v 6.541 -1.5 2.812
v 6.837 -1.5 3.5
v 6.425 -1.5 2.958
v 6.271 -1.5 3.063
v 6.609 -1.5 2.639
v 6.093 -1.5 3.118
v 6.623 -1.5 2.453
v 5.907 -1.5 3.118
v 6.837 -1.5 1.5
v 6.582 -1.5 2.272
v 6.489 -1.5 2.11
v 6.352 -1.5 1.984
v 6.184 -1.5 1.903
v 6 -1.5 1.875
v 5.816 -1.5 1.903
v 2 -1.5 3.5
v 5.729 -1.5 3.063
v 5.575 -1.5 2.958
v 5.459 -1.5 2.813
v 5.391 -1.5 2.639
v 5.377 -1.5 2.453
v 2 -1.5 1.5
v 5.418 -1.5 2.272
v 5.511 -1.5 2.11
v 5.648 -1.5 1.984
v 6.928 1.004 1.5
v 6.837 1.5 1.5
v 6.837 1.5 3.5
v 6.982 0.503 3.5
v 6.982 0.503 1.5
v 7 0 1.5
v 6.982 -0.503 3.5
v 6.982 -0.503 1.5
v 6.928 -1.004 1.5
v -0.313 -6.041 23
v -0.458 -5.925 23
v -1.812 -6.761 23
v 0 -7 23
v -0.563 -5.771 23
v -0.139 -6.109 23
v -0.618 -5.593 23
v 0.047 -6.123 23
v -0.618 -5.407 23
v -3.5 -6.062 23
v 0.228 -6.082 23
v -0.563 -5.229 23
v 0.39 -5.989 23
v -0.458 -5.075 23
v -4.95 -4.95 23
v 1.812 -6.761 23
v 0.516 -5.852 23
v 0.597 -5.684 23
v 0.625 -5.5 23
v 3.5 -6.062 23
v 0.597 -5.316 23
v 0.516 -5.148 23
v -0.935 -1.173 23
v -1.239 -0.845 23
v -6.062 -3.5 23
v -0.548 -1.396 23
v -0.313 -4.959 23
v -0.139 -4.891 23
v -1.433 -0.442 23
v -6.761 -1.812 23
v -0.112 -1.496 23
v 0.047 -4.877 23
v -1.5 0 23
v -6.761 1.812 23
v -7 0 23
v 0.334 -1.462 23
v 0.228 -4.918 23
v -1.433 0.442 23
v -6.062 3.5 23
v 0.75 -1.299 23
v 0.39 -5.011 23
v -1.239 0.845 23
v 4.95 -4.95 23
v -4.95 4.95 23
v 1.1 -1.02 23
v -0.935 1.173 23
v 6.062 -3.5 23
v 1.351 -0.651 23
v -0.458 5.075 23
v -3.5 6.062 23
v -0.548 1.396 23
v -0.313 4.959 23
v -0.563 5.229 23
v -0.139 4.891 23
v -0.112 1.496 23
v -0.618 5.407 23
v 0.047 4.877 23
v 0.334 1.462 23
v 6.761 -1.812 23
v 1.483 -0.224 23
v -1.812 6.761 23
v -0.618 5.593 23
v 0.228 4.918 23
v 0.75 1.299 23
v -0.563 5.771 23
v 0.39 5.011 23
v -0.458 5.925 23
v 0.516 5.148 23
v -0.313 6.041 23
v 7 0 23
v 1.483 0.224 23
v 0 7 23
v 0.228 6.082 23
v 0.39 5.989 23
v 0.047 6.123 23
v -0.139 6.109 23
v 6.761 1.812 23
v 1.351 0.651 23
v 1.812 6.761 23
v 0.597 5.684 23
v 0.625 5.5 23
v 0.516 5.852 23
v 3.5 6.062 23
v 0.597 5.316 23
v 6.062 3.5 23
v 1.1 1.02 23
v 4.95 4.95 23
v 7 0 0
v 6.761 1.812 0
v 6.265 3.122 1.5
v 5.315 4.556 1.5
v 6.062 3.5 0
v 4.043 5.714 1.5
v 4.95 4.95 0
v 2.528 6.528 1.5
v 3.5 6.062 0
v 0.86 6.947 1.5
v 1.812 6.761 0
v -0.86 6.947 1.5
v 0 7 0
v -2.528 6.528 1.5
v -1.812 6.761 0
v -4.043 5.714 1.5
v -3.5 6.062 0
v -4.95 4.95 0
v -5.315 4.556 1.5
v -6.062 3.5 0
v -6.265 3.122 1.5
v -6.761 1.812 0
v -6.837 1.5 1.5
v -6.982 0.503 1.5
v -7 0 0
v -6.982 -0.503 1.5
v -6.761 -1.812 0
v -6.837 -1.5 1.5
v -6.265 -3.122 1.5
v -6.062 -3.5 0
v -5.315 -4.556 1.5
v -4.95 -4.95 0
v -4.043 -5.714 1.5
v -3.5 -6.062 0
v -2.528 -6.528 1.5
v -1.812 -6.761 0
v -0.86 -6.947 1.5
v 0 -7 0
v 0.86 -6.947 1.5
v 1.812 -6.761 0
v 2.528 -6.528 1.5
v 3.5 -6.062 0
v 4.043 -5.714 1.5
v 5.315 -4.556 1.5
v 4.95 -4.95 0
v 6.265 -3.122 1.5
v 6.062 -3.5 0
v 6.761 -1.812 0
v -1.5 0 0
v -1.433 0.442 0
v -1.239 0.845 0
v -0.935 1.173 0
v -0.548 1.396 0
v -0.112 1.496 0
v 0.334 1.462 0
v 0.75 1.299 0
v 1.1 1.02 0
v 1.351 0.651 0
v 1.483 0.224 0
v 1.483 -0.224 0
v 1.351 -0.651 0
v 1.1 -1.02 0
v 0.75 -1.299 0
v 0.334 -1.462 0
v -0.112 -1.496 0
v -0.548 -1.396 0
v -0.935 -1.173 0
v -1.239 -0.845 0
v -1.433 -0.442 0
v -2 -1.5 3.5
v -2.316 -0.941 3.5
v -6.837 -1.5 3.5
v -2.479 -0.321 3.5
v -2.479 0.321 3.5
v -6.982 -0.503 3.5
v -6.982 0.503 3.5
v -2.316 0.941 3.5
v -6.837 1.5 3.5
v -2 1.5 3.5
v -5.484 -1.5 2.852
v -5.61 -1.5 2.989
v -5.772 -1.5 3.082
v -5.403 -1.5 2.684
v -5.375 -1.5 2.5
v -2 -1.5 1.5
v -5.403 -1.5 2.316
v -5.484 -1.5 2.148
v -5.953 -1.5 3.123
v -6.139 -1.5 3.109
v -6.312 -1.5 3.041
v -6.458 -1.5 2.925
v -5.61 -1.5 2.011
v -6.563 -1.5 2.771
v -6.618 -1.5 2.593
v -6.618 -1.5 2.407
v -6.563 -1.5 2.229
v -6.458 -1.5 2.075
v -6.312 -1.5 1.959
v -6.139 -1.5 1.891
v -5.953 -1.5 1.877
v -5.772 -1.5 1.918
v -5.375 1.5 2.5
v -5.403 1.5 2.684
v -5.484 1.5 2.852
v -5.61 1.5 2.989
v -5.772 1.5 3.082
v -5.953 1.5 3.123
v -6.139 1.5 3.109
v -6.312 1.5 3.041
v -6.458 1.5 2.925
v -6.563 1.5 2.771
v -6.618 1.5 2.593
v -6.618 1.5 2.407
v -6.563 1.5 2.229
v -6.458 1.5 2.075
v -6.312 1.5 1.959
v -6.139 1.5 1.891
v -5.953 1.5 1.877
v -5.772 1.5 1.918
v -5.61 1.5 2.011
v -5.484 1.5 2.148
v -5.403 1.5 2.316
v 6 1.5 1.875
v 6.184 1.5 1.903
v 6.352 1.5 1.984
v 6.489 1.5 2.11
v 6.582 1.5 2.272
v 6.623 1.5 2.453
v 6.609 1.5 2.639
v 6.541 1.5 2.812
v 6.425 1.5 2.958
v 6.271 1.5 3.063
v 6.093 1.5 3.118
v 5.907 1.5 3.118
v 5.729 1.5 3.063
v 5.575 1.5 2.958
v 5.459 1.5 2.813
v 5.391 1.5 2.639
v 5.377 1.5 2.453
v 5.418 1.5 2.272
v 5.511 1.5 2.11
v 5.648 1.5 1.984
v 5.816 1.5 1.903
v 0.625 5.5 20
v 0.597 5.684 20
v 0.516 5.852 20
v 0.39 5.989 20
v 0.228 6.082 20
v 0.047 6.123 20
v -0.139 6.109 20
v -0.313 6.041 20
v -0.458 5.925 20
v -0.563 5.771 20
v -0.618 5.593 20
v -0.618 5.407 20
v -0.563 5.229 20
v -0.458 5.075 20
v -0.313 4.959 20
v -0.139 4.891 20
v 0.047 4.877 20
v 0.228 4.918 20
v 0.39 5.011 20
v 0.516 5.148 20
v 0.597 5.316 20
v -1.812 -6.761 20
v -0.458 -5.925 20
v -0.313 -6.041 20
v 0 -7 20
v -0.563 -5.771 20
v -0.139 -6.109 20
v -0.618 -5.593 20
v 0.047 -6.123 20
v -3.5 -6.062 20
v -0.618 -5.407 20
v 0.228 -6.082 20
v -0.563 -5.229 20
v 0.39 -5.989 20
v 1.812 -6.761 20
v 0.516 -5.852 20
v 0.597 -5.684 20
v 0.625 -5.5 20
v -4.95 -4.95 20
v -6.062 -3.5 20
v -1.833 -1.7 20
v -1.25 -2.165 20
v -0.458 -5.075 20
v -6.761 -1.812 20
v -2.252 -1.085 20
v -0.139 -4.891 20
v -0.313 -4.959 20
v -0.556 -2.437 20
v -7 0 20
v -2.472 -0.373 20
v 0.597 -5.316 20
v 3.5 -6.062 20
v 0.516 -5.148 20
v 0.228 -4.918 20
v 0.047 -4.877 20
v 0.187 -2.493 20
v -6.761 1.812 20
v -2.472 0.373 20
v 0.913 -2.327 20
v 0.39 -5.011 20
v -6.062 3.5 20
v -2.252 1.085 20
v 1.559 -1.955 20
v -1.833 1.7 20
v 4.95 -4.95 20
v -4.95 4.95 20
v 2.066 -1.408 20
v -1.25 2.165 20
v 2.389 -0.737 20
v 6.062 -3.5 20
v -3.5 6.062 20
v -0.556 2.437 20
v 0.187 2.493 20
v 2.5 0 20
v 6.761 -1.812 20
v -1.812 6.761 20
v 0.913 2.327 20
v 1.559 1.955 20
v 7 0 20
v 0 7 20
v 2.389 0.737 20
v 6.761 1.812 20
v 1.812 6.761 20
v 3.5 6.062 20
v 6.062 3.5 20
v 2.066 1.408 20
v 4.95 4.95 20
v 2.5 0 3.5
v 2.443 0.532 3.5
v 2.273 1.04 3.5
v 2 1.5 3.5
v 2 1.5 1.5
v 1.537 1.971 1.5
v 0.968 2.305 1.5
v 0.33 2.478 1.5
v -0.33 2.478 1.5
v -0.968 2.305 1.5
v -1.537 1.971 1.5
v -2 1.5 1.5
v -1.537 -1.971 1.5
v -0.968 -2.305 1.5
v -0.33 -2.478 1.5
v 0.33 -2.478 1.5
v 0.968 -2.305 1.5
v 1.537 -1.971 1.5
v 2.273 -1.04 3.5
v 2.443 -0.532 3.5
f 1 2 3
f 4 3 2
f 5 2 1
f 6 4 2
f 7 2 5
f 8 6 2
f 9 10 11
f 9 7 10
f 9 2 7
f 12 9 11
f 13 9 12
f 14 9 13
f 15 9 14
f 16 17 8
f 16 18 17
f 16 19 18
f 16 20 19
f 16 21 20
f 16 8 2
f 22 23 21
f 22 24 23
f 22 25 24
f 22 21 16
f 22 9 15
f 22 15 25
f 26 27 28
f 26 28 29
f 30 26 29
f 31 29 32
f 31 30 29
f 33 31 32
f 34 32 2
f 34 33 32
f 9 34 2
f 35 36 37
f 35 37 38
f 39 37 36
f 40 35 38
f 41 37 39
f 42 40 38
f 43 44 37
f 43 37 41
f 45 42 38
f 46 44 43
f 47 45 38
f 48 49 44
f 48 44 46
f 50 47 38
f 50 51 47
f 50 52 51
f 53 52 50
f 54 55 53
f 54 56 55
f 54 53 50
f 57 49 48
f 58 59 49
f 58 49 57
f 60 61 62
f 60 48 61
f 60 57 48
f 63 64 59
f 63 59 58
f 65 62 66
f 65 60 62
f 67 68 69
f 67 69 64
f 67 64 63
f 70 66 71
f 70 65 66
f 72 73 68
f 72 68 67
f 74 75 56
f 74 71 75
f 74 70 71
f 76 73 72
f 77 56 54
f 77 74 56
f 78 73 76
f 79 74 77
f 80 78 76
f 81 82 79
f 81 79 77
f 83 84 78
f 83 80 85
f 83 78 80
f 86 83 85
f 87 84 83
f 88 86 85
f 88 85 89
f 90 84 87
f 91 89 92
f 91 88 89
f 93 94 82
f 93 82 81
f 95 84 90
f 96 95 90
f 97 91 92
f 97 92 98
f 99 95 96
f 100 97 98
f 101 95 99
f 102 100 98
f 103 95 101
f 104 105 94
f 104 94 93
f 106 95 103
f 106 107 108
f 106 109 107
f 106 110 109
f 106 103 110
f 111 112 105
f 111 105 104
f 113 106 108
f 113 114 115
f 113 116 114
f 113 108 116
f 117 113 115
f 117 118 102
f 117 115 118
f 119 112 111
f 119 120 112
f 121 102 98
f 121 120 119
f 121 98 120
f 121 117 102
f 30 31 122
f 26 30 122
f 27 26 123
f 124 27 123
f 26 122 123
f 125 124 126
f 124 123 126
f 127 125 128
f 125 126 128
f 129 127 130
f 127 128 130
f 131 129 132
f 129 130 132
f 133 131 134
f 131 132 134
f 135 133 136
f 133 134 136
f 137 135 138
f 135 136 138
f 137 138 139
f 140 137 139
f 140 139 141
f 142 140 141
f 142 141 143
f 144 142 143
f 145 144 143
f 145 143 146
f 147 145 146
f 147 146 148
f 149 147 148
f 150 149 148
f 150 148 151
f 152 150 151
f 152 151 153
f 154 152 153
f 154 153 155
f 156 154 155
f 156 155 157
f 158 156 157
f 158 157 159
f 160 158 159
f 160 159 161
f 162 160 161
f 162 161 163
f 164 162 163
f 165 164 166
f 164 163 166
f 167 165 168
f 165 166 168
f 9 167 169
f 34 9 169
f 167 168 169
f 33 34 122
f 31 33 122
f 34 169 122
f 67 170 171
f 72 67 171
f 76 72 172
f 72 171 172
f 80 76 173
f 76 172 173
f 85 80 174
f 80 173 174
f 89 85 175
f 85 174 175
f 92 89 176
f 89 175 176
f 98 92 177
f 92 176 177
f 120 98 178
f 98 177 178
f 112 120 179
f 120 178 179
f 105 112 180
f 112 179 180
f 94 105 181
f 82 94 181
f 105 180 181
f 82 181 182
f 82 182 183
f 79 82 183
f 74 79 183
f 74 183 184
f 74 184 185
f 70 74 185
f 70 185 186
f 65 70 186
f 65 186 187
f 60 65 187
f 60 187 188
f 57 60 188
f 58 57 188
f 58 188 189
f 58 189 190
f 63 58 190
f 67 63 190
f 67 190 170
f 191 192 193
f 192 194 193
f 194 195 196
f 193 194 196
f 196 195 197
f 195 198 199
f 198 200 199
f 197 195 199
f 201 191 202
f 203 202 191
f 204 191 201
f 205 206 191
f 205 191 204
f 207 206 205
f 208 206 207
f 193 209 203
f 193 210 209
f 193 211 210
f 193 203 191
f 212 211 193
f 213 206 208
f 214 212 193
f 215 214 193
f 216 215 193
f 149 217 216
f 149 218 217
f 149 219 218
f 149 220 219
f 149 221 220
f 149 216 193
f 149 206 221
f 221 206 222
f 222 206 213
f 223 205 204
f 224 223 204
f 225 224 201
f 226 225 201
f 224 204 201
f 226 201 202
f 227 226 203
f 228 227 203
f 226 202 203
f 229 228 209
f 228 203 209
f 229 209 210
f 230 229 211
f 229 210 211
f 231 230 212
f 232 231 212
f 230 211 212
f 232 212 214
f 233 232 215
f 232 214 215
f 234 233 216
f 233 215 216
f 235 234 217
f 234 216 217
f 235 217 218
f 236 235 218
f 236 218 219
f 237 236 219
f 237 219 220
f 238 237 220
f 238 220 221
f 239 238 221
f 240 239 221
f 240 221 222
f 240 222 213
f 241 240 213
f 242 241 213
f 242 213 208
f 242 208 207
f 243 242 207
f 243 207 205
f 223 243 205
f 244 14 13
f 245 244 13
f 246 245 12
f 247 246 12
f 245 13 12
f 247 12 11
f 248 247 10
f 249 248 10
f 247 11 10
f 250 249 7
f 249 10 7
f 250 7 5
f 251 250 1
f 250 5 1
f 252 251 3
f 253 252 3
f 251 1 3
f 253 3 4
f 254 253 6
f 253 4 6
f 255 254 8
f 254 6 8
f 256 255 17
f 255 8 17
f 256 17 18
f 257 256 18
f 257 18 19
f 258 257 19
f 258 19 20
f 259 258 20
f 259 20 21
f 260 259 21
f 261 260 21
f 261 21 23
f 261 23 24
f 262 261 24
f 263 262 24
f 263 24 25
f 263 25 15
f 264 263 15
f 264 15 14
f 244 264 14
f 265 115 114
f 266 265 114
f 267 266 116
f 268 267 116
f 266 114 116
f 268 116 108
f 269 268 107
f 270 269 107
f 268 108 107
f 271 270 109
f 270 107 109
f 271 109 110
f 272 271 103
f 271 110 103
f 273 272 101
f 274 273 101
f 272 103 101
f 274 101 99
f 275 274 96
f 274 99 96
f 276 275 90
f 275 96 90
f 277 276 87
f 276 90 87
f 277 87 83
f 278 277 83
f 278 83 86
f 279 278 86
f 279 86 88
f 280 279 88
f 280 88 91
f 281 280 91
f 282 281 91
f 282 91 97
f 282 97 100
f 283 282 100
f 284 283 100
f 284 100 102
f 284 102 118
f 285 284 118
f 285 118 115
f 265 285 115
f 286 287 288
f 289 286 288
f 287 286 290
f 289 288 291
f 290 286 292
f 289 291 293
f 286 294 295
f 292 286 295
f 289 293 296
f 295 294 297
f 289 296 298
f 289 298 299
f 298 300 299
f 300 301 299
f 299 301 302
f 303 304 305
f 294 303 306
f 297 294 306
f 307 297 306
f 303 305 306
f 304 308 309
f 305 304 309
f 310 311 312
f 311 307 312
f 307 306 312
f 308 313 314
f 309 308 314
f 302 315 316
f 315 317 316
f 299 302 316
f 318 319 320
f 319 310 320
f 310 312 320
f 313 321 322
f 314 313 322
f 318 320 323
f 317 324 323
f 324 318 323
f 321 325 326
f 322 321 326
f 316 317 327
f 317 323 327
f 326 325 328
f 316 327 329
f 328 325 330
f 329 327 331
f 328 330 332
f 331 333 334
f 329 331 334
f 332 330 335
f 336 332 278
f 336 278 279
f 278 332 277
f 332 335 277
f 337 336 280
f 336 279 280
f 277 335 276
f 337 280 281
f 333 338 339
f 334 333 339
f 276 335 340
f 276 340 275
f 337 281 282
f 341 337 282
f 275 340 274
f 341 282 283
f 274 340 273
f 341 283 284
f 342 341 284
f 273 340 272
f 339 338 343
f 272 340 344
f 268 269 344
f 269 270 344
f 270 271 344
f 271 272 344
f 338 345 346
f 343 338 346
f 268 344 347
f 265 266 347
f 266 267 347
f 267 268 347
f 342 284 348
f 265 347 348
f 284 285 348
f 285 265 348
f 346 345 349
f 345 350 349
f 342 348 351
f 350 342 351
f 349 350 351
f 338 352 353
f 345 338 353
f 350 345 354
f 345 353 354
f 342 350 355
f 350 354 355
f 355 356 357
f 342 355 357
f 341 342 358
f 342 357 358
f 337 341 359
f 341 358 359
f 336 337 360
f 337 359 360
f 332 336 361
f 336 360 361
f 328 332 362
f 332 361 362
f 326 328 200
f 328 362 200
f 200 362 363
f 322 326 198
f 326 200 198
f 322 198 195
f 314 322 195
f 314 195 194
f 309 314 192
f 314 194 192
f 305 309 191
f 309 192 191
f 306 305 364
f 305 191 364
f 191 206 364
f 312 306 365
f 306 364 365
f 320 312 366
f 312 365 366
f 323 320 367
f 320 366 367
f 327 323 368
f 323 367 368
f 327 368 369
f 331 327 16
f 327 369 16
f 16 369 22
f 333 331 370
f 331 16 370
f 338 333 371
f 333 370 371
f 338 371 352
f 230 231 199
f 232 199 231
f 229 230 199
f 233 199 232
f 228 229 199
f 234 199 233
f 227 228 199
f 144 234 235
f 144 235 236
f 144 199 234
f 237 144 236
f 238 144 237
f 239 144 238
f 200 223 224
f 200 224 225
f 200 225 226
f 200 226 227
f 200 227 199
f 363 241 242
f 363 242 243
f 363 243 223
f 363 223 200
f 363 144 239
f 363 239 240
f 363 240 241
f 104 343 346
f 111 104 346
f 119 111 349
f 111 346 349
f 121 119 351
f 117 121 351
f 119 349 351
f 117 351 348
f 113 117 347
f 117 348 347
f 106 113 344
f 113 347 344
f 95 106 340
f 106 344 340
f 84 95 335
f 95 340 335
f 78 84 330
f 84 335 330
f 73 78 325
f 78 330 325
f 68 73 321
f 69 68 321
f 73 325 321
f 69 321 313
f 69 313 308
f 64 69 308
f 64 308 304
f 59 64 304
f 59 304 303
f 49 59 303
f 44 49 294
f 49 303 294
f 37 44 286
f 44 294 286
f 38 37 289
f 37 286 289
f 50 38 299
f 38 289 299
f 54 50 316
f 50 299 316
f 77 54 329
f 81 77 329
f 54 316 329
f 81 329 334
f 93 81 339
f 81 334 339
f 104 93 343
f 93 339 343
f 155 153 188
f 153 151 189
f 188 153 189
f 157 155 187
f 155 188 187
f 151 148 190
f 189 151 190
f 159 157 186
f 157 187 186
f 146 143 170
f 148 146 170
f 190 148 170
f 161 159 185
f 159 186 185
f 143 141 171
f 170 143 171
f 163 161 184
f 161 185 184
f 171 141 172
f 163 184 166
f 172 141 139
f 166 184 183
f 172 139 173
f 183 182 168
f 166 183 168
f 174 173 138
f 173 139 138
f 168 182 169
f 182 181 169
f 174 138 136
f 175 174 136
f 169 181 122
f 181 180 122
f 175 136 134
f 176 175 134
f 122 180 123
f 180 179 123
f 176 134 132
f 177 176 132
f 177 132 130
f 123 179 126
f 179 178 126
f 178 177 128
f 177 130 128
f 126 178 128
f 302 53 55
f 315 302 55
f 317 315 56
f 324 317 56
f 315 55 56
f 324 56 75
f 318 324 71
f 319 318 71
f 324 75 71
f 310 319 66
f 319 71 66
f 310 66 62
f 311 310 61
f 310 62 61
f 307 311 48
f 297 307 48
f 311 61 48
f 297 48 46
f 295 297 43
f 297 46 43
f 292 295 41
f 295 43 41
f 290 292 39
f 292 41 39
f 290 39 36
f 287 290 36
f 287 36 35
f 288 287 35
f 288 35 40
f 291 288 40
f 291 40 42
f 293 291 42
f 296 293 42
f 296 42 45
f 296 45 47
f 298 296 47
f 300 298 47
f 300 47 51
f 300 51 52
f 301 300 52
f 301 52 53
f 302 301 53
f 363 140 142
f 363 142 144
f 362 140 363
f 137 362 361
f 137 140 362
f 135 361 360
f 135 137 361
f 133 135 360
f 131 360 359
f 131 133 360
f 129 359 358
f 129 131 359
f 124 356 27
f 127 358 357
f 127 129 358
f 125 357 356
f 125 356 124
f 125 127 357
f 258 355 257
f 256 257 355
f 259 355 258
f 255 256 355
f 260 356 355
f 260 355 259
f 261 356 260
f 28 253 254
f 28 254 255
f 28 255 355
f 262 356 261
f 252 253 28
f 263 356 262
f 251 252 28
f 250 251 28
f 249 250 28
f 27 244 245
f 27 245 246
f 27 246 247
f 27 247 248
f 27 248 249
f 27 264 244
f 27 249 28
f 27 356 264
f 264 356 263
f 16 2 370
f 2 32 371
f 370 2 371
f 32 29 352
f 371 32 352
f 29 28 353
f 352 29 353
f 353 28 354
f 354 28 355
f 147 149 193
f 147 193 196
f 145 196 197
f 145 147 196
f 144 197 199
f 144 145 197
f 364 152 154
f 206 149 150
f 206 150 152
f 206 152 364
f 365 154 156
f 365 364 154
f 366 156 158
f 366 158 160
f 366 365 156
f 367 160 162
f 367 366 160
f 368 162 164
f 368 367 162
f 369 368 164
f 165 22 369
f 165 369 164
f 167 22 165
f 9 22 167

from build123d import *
from build123d.topology import SkipClean

# Parameters (mm, degrees)
SKETCH1_R           = 7
BOSS_EXTRUDE1_DEPTH = 1.5
SKETCH2_R           = 2.5
BOSS_EXTRUDE2_DEPTH = 18.5
SKETCH3_R           = 7
BOSS_EXTRUDE3_DEPTH = 3
CUT_EXTRUDE1_REACH  = 27.04
SKETCH4_R           = 1.5
CUT_EXTRUDE4_REACH  = 27.04
SKETCH5_R           = 0.625
BOSS_EXTRUDE5_DEPTH = 2
CUT_EXTRUDE5_REACH  = 27.5
SKETCH16_R          = 0.625
CUT_EXTRUDE6_REACH  = 25.67
SKETCH17_R          = 1.5


with BuildPart() as part:
    # Sketch1 → Boss-Extrude1 (new body)
    with BuildSketch(Plane.XY):
        Circle(SKETCH1_R)
    extrude(amount=BOSS_EXTRUDE1_DEPTH)

    # Sketch2 → Boss-Extrude2 (add)
    with BuildSketch(Plane.XY.offset(1.5)):
        Circle(SKETCH2_R)
    extrude(amount=BOSS_EXTRUDE2_DEPTH)

    # Sketch3 → Boss-Extrude3 (add)
    with BuildSketch(Plane.XY.offset(20)):
        Circle(SKETCH3_R)
    extrude(amount=BOSS_EXTRUDE3_DEPTH)

    # Sketch4 → Cut-Extrude1 (cut, up to next)
    with BuildSketch(Plane(origin=(0, 0, 0), x_dir=(-1, 0, 0), z_dir=(0, 0, -1)), mode=Mode.PRIVATE) as cut_extrude1_sk1:
        Circle(SKETCH4_R)
    cut_extrude1_tool1 = extrude(cut_extrude1_sk1.sketch, amount=-CUT_EXTRUDE1_REACH, mode=Mode.PRIVATE) & part.part
    add(cut_extrude1_tool1.solids().sort_by_distance((0, 0, 0))[0], mode=Mode.SUBTRACT)

    # Sketch5 → Cut-Extrude4 (cut, up to next)
    with BuildSketch(Plane.XY.offset(23), mode=Mode.PRIVATE) as cut_extrude4_sk1:
        with Locations((0, 5.5)):
            Circle(SKETCH5_R)
    cut_extrude4_tool1 = extrude(cut_extrude4_sk1.sketch, amount=-CUT_EXTRUDE4_REACH, mode=Mode.PRIVATE) & part.part
    # Sketch5 → Cut-Extrude4 (cut, up to next)
    with BuildSketch(Plane.XY.offset(23), mode=Mode.PRIVATE) as cut_extrude4_sk2:
        with Locations((0, -5.5)):
            Circle(SKETCH5_R)
    cut_extrude4_tool2 = extrude(cut_extrude4_sk2.sketch, amount=-CUT_EXTRUDE4_REACH, mode=Mode.PRIVATE) & part.part
    add(cut_extrude4_tool1.solids().sort_by_distance((0, 5.5, 23))[0], mode=Mode.SUBTRACT)
    add(cut_extrude4_tool2.solids().sort_by_distance((0, -5.5, 23))[0], mode=Mode.SUBTRACT)

    # Sketch15 → Boss-Extrude5 (add)
    with SkipClean():  # the faces are left unmerged after this step: merging them gives an invalid solid
        with BuildSketch(Plane.XY.offset(1.5)):
            with BuildLine():
                Line((6.837397, -1.5), (-6.837397, -1.5))
                ThreePointArc((-6.837397, -1.5), (-7, 0), (-6.837397, 1.5))
                Line((-6.837397, 1.5), (6.837397, 1.5))
                ThreePointArc((6.837397, 1.5), (7, 0), (6.837397, -1.5))
            make_face()
        extrude(amount=BOSS_EXTRUDE5_DEPTH)

    # Sketch16 → Cut-Extrude5 (cut, up to next)
    with BuildSketch(Plane.XZ.offset(1.5), mode=Mode.PRIVATE) as cut_extrude5_sk1:
        with Locations((-6, 2.5)):
            Circle(SKETCH16_R)
    cut_extrude5_tool1 = extrude(cut_extrude5_sk1.sketch, amount=-CUT_EXTRUDE5_REACH, mode=Mode.PRIVATE) & part.part
    # Sketch16 → Cut-Extrude5 (cut, up to next)
    with BuildSketch(Plane.XZ.offset(1.5), mode=Mode.PRIVATE) as cut_extrude5_sk2:
        with Locations(Location((6, 2.5, 0), (0, 0, 270))):
            Circle(SKETCH16_R)
    cut_extrude5_tool2 = extrude(cut_extrude5_sk2.sketch, amount=-CUT_EXTRUDE5_REACH, mode=Mode.PRIVATE) & part.part
    add(cut_extrude5_tool1.solids().sort_by_distance((-6, -1.5, 2.5))[0], mode=Mode.SUBTRACT)
    add(cut_extrude5_tool2.solids().sort_by_distance((6, -1.5, 2.5))[0], mode=Mode.SUBTRACT)

    # Sketch17 → Cut-Extrude6 (cut, up to next)
    with BuildSketch(Plane(origin=(0, 0, 1.5), x_dir=(-1, 0, 0), z_dir=(0, 0, -1)), mode=Mode.PRIVATE) as cut_extrude6_sk1:
        Circle(SKETCH17_R)
    cut_extrude6_tool1 = extrude(cut_extrude6_sk1.sketch, amount=-CUT_EXTRUDE6_REACH, mode=Mode.PRIVATE) & part.part
    add(cut_extrude6_tool1.solids().sort_by_distance((0, 0, 1.5))[0], mode=Mode.SUBTRACT)


solid = part.part
